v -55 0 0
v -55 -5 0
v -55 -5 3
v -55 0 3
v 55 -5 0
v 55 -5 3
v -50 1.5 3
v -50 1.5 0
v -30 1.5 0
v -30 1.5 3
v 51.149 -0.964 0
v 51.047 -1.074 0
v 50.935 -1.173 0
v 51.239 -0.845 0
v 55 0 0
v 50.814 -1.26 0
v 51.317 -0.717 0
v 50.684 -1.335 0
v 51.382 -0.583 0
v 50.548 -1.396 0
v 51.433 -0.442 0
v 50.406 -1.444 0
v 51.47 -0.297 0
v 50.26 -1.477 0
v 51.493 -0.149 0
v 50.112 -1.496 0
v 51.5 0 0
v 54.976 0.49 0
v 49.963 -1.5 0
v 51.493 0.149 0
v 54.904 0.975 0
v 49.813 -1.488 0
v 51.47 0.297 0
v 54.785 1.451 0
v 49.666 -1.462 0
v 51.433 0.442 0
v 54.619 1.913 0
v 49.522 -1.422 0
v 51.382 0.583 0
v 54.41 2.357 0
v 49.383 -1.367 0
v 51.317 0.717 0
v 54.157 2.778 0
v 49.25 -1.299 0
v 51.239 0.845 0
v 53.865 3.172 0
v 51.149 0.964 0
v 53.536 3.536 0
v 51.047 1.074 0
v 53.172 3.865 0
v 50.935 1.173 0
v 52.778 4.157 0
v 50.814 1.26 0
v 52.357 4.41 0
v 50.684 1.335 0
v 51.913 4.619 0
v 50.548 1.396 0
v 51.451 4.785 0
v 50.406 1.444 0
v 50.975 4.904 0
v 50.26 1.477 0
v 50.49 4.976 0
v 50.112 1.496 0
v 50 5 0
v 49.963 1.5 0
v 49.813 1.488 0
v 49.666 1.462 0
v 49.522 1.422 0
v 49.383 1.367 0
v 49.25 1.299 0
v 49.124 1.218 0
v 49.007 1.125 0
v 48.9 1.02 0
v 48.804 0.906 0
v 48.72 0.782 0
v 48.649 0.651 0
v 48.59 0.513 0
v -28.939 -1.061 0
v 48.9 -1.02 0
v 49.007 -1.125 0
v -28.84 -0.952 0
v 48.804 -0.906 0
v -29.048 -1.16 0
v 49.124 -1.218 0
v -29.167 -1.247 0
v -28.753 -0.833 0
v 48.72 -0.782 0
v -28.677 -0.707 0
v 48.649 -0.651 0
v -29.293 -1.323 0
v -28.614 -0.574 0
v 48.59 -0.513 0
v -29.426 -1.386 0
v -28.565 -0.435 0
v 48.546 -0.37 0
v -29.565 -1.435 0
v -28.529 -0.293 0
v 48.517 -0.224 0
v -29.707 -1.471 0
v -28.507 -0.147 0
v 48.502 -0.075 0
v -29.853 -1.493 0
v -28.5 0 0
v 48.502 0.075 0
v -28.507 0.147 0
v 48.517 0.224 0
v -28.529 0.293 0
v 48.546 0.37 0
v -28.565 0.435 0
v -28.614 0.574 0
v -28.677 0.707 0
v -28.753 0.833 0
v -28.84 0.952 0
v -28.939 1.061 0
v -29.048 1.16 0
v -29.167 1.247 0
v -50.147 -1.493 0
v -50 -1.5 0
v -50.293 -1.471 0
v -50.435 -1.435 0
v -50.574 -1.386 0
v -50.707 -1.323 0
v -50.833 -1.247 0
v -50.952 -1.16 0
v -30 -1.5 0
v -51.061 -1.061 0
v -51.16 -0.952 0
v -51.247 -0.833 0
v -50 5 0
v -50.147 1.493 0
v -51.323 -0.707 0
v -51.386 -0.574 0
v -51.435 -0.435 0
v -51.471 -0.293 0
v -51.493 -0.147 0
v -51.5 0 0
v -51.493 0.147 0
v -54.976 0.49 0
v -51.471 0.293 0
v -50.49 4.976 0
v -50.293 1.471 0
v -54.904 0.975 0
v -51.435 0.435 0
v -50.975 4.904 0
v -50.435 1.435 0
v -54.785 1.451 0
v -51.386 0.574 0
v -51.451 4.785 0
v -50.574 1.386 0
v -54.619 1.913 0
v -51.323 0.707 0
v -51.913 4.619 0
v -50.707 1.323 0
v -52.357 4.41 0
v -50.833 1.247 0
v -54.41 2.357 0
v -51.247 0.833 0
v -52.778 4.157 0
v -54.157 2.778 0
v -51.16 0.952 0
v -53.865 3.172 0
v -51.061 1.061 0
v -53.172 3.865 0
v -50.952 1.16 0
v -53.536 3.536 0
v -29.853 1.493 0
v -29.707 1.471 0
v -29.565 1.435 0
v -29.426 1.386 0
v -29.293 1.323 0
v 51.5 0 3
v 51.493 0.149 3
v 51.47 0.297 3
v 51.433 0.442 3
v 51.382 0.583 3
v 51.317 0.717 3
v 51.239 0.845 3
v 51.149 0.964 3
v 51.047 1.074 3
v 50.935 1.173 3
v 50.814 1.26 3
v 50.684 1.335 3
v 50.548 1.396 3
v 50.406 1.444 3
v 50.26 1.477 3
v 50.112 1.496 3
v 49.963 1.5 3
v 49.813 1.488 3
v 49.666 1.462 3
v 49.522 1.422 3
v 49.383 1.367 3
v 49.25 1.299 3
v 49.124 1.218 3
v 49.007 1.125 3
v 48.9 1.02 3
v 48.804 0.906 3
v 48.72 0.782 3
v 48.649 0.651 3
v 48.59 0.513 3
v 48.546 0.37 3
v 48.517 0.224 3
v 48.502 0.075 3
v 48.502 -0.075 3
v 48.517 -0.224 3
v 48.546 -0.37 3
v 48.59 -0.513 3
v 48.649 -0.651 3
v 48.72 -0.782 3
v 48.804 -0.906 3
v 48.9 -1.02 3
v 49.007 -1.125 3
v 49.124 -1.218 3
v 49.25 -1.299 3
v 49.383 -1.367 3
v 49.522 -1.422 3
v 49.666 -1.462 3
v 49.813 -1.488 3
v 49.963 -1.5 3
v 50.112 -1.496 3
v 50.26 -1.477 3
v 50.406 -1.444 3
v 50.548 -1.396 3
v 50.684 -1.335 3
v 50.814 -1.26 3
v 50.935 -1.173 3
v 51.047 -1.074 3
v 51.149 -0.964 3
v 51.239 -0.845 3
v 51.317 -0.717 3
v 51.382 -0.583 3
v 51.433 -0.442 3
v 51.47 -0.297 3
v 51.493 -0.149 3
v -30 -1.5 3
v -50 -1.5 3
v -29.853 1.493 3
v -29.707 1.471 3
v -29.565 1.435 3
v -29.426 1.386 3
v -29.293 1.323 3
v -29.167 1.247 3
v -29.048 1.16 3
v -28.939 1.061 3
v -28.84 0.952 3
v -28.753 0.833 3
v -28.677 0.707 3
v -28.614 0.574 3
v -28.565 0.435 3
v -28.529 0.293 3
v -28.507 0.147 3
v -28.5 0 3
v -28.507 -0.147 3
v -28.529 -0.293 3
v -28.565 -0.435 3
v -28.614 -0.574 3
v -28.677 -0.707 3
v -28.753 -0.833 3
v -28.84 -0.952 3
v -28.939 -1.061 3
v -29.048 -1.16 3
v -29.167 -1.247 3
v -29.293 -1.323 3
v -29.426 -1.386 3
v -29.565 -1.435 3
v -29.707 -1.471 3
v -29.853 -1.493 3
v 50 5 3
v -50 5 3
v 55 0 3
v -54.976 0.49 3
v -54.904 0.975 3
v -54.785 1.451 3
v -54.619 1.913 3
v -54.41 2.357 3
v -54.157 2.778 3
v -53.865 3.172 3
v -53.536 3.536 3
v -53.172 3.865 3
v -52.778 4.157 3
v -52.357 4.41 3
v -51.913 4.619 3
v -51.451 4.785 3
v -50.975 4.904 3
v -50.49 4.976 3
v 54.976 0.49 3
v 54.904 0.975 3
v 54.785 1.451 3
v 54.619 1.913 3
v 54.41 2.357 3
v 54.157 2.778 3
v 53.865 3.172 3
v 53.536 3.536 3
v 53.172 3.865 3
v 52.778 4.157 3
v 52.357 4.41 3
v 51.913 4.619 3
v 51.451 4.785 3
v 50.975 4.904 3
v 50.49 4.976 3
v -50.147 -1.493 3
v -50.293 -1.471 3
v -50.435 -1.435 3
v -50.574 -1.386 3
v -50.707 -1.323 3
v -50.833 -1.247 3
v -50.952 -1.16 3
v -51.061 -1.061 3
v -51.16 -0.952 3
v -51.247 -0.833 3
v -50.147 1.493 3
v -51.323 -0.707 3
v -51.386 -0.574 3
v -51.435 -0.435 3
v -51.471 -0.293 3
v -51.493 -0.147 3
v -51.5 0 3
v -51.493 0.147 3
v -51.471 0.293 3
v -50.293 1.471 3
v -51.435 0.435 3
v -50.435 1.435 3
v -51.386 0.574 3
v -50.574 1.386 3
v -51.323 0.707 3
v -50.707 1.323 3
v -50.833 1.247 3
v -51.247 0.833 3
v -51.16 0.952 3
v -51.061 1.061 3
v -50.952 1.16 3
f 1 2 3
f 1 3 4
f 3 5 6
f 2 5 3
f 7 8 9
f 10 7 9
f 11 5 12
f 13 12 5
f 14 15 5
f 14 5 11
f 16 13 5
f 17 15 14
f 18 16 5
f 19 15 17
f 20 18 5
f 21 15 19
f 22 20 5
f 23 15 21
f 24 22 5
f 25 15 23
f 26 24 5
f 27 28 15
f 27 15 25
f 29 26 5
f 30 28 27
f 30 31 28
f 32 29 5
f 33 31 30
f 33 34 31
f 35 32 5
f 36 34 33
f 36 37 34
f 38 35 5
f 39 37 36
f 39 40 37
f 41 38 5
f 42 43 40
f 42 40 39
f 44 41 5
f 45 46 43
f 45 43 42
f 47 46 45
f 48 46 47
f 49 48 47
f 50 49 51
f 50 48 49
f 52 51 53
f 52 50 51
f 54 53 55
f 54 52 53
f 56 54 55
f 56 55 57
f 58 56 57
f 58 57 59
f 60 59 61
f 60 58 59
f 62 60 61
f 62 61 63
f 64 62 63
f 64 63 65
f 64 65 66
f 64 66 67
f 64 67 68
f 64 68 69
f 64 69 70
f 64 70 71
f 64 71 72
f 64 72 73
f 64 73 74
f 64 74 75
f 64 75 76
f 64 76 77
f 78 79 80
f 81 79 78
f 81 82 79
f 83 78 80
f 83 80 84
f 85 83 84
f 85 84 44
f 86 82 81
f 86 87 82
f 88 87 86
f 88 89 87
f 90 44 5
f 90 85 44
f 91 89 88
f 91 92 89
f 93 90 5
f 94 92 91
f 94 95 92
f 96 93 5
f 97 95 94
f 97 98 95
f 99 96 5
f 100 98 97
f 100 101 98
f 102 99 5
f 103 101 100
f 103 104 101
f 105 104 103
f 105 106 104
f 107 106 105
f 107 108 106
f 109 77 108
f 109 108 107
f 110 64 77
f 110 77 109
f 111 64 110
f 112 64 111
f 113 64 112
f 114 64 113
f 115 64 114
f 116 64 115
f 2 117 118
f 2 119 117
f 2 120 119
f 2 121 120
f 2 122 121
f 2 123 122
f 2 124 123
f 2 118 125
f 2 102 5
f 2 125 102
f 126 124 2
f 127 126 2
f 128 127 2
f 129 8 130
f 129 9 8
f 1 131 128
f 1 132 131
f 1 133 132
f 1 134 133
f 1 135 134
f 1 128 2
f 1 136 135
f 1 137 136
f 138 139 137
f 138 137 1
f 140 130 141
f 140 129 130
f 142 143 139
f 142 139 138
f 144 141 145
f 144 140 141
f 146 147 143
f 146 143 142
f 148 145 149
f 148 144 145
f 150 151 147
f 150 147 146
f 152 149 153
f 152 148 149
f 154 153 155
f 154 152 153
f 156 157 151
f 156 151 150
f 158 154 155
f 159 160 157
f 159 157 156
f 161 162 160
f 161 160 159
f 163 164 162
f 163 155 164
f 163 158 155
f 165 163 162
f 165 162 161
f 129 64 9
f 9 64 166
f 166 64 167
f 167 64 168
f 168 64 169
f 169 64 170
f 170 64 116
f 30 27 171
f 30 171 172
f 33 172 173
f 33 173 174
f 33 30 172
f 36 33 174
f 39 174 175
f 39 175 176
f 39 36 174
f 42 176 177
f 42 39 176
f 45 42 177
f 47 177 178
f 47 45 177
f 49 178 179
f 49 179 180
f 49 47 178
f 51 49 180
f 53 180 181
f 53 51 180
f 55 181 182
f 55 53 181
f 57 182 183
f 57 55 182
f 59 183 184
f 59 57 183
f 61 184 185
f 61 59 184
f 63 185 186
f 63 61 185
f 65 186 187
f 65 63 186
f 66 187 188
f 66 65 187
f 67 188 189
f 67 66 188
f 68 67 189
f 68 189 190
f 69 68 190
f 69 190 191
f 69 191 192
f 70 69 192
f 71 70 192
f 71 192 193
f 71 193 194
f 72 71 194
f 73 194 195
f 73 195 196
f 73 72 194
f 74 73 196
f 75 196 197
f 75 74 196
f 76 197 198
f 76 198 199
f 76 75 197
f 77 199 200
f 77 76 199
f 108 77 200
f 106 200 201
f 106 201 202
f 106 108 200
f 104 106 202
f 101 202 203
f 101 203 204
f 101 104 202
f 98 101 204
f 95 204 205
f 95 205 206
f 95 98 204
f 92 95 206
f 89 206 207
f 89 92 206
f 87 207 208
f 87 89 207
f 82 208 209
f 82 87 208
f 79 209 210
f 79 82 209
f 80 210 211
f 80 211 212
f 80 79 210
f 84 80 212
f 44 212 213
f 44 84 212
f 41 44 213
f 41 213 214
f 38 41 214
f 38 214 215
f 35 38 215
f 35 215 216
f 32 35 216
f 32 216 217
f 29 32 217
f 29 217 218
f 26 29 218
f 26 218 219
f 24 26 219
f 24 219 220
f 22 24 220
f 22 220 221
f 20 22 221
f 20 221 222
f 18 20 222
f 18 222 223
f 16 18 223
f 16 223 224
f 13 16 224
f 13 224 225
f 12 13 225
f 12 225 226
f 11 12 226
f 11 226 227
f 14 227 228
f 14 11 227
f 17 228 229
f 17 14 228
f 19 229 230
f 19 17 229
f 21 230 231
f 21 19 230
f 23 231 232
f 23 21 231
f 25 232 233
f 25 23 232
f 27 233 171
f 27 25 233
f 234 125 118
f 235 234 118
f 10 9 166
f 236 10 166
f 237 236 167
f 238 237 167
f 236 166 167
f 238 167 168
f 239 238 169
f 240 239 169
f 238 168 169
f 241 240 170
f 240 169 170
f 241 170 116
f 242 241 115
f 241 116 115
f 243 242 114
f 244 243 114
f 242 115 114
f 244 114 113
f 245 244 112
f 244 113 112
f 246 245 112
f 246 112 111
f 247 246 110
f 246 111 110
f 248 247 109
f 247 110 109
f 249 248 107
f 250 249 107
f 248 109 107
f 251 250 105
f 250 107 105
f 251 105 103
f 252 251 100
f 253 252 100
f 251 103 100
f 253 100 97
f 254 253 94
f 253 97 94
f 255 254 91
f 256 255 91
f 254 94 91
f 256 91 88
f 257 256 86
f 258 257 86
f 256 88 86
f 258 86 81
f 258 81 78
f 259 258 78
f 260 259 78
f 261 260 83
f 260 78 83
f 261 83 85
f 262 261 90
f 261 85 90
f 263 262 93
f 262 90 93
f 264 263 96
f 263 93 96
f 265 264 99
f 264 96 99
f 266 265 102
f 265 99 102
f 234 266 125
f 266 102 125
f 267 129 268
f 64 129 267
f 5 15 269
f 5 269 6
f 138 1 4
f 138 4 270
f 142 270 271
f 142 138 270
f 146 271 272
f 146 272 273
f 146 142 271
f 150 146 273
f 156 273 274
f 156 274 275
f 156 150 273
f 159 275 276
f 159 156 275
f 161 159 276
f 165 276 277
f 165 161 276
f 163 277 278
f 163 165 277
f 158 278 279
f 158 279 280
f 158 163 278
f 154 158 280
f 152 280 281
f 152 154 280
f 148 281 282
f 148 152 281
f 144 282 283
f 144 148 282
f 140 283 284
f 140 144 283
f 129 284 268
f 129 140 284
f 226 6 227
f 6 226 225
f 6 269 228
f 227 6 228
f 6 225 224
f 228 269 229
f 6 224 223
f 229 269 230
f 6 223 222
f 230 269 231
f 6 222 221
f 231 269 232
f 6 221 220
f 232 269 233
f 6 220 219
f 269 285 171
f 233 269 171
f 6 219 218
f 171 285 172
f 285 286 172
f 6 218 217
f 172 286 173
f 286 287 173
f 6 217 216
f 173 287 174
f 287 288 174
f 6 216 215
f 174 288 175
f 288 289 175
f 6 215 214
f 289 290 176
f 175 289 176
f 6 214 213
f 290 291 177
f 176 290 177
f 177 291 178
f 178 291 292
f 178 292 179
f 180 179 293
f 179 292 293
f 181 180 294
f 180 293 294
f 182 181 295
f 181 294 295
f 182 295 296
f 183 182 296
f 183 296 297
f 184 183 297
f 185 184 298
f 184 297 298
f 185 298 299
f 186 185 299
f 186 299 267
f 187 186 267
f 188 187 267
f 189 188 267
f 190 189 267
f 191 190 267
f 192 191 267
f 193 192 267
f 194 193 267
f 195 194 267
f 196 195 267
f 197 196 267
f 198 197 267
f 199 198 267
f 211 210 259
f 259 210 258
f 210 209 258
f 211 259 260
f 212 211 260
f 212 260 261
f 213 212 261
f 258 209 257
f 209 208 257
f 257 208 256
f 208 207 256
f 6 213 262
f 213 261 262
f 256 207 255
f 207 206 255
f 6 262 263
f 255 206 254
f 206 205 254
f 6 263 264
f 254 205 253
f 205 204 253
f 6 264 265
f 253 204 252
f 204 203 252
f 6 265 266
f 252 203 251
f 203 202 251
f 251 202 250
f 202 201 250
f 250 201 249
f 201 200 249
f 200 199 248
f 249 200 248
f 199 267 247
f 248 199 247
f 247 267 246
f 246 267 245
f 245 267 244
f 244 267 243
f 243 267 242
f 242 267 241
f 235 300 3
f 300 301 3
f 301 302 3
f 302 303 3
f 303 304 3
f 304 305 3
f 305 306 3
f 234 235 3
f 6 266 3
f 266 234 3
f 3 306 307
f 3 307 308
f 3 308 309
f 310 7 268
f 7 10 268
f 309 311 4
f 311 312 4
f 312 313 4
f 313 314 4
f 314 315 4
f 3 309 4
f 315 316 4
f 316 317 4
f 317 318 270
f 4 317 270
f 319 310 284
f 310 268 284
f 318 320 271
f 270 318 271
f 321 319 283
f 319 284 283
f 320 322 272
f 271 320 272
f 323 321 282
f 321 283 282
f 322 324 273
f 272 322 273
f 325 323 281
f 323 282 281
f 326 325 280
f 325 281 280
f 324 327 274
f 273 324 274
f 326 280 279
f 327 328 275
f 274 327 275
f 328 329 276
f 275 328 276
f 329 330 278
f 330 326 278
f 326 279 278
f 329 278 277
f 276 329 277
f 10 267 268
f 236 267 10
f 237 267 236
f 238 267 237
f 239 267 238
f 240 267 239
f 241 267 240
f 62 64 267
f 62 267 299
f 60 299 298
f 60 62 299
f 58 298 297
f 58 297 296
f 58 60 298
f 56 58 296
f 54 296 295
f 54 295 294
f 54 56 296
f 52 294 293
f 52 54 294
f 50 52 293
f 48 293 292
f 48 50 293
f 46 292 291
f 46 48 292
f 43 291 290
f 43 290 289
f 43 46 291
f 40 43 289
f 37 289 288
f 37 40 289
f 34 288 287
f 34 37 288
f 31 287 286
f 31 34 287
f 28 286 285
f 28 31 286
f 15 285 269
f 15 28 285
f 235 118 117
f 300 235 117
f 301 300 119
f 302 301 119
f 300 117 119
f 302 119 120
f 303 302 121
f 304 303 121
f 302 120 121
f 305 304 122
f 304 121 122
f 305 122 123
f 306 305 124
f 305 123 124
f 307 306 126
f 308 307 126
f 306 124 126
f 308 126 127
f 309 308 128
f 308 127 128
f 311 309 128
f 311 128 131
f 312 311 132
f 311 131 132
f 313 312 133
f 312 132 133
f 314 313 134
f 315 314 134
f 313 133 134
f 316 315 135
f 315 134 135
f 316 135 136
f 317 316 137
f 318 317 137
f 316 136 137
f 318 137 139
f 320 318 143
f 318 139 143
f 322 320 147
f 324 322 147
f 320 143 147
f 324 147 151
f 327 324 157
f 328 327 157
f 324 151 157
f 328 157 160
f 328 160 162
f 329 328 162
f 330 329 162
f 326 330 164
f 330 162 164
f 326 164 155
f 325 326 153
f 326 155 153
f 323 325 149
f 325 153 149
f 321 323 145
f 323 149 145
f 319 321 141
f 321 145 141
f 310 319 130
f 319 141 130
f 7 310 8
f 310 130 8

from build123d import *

# Parameters (mm, degrees)
SKETCH1_R           = 1.5
BOSS_EXTRUDE1_DEPTH = 3


with BuildPart() as part:
    # Sketch1 → Boss-Extrude1 (new body)
    with BuildSketch(Plane.XY):
        with BuildLine():
            Line((50, -5), (-50, -5))
            Line((-50, -5), (-55, -5))
            Line((-55, -5), (-55, 0))
            ThreePointArc((-55, 0), (-53.535533906, 3.535533906), (-50, 5))
            Line((-50, 5), (50, 5))
            ThreePointArc((50, 5), (53.535533906, 3.535533906), (55, 0))
            Line((55, 0), (55, -5))
            Line((55, -5), (50, -5))
        make_face()
        with Locations((50, 0)):
            Circle(SKETCH1_R, mode=Mode.SUBTRACT)
        with BuildLine():
            Line((-50, 1.5), (-30, 1.5))
            ThreePointArc((-30, 1.5), (-28.5, 0), (-30, -1.5))
            Line((-30, -1.5), (-50, -1.5))
            ThreePointArc((-50, -1.5), (-51.5, 0), (-50, 1.5))
        make_face(mode=Mode.SUBTRACT)
    extrude(amount=BOSS_EXTRUDE1_DEPTH)


solid = part.part
